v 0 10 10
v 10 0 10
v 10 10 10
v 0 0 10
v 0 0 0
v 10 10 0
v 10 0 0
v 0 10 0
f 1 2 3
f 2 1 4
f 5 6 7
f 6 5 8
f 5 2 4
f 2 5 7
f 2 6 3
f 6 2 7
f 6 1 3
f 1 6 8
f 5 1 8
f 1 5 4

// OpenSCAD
// presetdir.scad — minimal fixture design with a presetdir.json sibling,
// used to exercise designs[].presets.images' DIRECTORY form.
/* [Basics] */
// Size in mm.
size = 10; // [1:50]
cube(size);
